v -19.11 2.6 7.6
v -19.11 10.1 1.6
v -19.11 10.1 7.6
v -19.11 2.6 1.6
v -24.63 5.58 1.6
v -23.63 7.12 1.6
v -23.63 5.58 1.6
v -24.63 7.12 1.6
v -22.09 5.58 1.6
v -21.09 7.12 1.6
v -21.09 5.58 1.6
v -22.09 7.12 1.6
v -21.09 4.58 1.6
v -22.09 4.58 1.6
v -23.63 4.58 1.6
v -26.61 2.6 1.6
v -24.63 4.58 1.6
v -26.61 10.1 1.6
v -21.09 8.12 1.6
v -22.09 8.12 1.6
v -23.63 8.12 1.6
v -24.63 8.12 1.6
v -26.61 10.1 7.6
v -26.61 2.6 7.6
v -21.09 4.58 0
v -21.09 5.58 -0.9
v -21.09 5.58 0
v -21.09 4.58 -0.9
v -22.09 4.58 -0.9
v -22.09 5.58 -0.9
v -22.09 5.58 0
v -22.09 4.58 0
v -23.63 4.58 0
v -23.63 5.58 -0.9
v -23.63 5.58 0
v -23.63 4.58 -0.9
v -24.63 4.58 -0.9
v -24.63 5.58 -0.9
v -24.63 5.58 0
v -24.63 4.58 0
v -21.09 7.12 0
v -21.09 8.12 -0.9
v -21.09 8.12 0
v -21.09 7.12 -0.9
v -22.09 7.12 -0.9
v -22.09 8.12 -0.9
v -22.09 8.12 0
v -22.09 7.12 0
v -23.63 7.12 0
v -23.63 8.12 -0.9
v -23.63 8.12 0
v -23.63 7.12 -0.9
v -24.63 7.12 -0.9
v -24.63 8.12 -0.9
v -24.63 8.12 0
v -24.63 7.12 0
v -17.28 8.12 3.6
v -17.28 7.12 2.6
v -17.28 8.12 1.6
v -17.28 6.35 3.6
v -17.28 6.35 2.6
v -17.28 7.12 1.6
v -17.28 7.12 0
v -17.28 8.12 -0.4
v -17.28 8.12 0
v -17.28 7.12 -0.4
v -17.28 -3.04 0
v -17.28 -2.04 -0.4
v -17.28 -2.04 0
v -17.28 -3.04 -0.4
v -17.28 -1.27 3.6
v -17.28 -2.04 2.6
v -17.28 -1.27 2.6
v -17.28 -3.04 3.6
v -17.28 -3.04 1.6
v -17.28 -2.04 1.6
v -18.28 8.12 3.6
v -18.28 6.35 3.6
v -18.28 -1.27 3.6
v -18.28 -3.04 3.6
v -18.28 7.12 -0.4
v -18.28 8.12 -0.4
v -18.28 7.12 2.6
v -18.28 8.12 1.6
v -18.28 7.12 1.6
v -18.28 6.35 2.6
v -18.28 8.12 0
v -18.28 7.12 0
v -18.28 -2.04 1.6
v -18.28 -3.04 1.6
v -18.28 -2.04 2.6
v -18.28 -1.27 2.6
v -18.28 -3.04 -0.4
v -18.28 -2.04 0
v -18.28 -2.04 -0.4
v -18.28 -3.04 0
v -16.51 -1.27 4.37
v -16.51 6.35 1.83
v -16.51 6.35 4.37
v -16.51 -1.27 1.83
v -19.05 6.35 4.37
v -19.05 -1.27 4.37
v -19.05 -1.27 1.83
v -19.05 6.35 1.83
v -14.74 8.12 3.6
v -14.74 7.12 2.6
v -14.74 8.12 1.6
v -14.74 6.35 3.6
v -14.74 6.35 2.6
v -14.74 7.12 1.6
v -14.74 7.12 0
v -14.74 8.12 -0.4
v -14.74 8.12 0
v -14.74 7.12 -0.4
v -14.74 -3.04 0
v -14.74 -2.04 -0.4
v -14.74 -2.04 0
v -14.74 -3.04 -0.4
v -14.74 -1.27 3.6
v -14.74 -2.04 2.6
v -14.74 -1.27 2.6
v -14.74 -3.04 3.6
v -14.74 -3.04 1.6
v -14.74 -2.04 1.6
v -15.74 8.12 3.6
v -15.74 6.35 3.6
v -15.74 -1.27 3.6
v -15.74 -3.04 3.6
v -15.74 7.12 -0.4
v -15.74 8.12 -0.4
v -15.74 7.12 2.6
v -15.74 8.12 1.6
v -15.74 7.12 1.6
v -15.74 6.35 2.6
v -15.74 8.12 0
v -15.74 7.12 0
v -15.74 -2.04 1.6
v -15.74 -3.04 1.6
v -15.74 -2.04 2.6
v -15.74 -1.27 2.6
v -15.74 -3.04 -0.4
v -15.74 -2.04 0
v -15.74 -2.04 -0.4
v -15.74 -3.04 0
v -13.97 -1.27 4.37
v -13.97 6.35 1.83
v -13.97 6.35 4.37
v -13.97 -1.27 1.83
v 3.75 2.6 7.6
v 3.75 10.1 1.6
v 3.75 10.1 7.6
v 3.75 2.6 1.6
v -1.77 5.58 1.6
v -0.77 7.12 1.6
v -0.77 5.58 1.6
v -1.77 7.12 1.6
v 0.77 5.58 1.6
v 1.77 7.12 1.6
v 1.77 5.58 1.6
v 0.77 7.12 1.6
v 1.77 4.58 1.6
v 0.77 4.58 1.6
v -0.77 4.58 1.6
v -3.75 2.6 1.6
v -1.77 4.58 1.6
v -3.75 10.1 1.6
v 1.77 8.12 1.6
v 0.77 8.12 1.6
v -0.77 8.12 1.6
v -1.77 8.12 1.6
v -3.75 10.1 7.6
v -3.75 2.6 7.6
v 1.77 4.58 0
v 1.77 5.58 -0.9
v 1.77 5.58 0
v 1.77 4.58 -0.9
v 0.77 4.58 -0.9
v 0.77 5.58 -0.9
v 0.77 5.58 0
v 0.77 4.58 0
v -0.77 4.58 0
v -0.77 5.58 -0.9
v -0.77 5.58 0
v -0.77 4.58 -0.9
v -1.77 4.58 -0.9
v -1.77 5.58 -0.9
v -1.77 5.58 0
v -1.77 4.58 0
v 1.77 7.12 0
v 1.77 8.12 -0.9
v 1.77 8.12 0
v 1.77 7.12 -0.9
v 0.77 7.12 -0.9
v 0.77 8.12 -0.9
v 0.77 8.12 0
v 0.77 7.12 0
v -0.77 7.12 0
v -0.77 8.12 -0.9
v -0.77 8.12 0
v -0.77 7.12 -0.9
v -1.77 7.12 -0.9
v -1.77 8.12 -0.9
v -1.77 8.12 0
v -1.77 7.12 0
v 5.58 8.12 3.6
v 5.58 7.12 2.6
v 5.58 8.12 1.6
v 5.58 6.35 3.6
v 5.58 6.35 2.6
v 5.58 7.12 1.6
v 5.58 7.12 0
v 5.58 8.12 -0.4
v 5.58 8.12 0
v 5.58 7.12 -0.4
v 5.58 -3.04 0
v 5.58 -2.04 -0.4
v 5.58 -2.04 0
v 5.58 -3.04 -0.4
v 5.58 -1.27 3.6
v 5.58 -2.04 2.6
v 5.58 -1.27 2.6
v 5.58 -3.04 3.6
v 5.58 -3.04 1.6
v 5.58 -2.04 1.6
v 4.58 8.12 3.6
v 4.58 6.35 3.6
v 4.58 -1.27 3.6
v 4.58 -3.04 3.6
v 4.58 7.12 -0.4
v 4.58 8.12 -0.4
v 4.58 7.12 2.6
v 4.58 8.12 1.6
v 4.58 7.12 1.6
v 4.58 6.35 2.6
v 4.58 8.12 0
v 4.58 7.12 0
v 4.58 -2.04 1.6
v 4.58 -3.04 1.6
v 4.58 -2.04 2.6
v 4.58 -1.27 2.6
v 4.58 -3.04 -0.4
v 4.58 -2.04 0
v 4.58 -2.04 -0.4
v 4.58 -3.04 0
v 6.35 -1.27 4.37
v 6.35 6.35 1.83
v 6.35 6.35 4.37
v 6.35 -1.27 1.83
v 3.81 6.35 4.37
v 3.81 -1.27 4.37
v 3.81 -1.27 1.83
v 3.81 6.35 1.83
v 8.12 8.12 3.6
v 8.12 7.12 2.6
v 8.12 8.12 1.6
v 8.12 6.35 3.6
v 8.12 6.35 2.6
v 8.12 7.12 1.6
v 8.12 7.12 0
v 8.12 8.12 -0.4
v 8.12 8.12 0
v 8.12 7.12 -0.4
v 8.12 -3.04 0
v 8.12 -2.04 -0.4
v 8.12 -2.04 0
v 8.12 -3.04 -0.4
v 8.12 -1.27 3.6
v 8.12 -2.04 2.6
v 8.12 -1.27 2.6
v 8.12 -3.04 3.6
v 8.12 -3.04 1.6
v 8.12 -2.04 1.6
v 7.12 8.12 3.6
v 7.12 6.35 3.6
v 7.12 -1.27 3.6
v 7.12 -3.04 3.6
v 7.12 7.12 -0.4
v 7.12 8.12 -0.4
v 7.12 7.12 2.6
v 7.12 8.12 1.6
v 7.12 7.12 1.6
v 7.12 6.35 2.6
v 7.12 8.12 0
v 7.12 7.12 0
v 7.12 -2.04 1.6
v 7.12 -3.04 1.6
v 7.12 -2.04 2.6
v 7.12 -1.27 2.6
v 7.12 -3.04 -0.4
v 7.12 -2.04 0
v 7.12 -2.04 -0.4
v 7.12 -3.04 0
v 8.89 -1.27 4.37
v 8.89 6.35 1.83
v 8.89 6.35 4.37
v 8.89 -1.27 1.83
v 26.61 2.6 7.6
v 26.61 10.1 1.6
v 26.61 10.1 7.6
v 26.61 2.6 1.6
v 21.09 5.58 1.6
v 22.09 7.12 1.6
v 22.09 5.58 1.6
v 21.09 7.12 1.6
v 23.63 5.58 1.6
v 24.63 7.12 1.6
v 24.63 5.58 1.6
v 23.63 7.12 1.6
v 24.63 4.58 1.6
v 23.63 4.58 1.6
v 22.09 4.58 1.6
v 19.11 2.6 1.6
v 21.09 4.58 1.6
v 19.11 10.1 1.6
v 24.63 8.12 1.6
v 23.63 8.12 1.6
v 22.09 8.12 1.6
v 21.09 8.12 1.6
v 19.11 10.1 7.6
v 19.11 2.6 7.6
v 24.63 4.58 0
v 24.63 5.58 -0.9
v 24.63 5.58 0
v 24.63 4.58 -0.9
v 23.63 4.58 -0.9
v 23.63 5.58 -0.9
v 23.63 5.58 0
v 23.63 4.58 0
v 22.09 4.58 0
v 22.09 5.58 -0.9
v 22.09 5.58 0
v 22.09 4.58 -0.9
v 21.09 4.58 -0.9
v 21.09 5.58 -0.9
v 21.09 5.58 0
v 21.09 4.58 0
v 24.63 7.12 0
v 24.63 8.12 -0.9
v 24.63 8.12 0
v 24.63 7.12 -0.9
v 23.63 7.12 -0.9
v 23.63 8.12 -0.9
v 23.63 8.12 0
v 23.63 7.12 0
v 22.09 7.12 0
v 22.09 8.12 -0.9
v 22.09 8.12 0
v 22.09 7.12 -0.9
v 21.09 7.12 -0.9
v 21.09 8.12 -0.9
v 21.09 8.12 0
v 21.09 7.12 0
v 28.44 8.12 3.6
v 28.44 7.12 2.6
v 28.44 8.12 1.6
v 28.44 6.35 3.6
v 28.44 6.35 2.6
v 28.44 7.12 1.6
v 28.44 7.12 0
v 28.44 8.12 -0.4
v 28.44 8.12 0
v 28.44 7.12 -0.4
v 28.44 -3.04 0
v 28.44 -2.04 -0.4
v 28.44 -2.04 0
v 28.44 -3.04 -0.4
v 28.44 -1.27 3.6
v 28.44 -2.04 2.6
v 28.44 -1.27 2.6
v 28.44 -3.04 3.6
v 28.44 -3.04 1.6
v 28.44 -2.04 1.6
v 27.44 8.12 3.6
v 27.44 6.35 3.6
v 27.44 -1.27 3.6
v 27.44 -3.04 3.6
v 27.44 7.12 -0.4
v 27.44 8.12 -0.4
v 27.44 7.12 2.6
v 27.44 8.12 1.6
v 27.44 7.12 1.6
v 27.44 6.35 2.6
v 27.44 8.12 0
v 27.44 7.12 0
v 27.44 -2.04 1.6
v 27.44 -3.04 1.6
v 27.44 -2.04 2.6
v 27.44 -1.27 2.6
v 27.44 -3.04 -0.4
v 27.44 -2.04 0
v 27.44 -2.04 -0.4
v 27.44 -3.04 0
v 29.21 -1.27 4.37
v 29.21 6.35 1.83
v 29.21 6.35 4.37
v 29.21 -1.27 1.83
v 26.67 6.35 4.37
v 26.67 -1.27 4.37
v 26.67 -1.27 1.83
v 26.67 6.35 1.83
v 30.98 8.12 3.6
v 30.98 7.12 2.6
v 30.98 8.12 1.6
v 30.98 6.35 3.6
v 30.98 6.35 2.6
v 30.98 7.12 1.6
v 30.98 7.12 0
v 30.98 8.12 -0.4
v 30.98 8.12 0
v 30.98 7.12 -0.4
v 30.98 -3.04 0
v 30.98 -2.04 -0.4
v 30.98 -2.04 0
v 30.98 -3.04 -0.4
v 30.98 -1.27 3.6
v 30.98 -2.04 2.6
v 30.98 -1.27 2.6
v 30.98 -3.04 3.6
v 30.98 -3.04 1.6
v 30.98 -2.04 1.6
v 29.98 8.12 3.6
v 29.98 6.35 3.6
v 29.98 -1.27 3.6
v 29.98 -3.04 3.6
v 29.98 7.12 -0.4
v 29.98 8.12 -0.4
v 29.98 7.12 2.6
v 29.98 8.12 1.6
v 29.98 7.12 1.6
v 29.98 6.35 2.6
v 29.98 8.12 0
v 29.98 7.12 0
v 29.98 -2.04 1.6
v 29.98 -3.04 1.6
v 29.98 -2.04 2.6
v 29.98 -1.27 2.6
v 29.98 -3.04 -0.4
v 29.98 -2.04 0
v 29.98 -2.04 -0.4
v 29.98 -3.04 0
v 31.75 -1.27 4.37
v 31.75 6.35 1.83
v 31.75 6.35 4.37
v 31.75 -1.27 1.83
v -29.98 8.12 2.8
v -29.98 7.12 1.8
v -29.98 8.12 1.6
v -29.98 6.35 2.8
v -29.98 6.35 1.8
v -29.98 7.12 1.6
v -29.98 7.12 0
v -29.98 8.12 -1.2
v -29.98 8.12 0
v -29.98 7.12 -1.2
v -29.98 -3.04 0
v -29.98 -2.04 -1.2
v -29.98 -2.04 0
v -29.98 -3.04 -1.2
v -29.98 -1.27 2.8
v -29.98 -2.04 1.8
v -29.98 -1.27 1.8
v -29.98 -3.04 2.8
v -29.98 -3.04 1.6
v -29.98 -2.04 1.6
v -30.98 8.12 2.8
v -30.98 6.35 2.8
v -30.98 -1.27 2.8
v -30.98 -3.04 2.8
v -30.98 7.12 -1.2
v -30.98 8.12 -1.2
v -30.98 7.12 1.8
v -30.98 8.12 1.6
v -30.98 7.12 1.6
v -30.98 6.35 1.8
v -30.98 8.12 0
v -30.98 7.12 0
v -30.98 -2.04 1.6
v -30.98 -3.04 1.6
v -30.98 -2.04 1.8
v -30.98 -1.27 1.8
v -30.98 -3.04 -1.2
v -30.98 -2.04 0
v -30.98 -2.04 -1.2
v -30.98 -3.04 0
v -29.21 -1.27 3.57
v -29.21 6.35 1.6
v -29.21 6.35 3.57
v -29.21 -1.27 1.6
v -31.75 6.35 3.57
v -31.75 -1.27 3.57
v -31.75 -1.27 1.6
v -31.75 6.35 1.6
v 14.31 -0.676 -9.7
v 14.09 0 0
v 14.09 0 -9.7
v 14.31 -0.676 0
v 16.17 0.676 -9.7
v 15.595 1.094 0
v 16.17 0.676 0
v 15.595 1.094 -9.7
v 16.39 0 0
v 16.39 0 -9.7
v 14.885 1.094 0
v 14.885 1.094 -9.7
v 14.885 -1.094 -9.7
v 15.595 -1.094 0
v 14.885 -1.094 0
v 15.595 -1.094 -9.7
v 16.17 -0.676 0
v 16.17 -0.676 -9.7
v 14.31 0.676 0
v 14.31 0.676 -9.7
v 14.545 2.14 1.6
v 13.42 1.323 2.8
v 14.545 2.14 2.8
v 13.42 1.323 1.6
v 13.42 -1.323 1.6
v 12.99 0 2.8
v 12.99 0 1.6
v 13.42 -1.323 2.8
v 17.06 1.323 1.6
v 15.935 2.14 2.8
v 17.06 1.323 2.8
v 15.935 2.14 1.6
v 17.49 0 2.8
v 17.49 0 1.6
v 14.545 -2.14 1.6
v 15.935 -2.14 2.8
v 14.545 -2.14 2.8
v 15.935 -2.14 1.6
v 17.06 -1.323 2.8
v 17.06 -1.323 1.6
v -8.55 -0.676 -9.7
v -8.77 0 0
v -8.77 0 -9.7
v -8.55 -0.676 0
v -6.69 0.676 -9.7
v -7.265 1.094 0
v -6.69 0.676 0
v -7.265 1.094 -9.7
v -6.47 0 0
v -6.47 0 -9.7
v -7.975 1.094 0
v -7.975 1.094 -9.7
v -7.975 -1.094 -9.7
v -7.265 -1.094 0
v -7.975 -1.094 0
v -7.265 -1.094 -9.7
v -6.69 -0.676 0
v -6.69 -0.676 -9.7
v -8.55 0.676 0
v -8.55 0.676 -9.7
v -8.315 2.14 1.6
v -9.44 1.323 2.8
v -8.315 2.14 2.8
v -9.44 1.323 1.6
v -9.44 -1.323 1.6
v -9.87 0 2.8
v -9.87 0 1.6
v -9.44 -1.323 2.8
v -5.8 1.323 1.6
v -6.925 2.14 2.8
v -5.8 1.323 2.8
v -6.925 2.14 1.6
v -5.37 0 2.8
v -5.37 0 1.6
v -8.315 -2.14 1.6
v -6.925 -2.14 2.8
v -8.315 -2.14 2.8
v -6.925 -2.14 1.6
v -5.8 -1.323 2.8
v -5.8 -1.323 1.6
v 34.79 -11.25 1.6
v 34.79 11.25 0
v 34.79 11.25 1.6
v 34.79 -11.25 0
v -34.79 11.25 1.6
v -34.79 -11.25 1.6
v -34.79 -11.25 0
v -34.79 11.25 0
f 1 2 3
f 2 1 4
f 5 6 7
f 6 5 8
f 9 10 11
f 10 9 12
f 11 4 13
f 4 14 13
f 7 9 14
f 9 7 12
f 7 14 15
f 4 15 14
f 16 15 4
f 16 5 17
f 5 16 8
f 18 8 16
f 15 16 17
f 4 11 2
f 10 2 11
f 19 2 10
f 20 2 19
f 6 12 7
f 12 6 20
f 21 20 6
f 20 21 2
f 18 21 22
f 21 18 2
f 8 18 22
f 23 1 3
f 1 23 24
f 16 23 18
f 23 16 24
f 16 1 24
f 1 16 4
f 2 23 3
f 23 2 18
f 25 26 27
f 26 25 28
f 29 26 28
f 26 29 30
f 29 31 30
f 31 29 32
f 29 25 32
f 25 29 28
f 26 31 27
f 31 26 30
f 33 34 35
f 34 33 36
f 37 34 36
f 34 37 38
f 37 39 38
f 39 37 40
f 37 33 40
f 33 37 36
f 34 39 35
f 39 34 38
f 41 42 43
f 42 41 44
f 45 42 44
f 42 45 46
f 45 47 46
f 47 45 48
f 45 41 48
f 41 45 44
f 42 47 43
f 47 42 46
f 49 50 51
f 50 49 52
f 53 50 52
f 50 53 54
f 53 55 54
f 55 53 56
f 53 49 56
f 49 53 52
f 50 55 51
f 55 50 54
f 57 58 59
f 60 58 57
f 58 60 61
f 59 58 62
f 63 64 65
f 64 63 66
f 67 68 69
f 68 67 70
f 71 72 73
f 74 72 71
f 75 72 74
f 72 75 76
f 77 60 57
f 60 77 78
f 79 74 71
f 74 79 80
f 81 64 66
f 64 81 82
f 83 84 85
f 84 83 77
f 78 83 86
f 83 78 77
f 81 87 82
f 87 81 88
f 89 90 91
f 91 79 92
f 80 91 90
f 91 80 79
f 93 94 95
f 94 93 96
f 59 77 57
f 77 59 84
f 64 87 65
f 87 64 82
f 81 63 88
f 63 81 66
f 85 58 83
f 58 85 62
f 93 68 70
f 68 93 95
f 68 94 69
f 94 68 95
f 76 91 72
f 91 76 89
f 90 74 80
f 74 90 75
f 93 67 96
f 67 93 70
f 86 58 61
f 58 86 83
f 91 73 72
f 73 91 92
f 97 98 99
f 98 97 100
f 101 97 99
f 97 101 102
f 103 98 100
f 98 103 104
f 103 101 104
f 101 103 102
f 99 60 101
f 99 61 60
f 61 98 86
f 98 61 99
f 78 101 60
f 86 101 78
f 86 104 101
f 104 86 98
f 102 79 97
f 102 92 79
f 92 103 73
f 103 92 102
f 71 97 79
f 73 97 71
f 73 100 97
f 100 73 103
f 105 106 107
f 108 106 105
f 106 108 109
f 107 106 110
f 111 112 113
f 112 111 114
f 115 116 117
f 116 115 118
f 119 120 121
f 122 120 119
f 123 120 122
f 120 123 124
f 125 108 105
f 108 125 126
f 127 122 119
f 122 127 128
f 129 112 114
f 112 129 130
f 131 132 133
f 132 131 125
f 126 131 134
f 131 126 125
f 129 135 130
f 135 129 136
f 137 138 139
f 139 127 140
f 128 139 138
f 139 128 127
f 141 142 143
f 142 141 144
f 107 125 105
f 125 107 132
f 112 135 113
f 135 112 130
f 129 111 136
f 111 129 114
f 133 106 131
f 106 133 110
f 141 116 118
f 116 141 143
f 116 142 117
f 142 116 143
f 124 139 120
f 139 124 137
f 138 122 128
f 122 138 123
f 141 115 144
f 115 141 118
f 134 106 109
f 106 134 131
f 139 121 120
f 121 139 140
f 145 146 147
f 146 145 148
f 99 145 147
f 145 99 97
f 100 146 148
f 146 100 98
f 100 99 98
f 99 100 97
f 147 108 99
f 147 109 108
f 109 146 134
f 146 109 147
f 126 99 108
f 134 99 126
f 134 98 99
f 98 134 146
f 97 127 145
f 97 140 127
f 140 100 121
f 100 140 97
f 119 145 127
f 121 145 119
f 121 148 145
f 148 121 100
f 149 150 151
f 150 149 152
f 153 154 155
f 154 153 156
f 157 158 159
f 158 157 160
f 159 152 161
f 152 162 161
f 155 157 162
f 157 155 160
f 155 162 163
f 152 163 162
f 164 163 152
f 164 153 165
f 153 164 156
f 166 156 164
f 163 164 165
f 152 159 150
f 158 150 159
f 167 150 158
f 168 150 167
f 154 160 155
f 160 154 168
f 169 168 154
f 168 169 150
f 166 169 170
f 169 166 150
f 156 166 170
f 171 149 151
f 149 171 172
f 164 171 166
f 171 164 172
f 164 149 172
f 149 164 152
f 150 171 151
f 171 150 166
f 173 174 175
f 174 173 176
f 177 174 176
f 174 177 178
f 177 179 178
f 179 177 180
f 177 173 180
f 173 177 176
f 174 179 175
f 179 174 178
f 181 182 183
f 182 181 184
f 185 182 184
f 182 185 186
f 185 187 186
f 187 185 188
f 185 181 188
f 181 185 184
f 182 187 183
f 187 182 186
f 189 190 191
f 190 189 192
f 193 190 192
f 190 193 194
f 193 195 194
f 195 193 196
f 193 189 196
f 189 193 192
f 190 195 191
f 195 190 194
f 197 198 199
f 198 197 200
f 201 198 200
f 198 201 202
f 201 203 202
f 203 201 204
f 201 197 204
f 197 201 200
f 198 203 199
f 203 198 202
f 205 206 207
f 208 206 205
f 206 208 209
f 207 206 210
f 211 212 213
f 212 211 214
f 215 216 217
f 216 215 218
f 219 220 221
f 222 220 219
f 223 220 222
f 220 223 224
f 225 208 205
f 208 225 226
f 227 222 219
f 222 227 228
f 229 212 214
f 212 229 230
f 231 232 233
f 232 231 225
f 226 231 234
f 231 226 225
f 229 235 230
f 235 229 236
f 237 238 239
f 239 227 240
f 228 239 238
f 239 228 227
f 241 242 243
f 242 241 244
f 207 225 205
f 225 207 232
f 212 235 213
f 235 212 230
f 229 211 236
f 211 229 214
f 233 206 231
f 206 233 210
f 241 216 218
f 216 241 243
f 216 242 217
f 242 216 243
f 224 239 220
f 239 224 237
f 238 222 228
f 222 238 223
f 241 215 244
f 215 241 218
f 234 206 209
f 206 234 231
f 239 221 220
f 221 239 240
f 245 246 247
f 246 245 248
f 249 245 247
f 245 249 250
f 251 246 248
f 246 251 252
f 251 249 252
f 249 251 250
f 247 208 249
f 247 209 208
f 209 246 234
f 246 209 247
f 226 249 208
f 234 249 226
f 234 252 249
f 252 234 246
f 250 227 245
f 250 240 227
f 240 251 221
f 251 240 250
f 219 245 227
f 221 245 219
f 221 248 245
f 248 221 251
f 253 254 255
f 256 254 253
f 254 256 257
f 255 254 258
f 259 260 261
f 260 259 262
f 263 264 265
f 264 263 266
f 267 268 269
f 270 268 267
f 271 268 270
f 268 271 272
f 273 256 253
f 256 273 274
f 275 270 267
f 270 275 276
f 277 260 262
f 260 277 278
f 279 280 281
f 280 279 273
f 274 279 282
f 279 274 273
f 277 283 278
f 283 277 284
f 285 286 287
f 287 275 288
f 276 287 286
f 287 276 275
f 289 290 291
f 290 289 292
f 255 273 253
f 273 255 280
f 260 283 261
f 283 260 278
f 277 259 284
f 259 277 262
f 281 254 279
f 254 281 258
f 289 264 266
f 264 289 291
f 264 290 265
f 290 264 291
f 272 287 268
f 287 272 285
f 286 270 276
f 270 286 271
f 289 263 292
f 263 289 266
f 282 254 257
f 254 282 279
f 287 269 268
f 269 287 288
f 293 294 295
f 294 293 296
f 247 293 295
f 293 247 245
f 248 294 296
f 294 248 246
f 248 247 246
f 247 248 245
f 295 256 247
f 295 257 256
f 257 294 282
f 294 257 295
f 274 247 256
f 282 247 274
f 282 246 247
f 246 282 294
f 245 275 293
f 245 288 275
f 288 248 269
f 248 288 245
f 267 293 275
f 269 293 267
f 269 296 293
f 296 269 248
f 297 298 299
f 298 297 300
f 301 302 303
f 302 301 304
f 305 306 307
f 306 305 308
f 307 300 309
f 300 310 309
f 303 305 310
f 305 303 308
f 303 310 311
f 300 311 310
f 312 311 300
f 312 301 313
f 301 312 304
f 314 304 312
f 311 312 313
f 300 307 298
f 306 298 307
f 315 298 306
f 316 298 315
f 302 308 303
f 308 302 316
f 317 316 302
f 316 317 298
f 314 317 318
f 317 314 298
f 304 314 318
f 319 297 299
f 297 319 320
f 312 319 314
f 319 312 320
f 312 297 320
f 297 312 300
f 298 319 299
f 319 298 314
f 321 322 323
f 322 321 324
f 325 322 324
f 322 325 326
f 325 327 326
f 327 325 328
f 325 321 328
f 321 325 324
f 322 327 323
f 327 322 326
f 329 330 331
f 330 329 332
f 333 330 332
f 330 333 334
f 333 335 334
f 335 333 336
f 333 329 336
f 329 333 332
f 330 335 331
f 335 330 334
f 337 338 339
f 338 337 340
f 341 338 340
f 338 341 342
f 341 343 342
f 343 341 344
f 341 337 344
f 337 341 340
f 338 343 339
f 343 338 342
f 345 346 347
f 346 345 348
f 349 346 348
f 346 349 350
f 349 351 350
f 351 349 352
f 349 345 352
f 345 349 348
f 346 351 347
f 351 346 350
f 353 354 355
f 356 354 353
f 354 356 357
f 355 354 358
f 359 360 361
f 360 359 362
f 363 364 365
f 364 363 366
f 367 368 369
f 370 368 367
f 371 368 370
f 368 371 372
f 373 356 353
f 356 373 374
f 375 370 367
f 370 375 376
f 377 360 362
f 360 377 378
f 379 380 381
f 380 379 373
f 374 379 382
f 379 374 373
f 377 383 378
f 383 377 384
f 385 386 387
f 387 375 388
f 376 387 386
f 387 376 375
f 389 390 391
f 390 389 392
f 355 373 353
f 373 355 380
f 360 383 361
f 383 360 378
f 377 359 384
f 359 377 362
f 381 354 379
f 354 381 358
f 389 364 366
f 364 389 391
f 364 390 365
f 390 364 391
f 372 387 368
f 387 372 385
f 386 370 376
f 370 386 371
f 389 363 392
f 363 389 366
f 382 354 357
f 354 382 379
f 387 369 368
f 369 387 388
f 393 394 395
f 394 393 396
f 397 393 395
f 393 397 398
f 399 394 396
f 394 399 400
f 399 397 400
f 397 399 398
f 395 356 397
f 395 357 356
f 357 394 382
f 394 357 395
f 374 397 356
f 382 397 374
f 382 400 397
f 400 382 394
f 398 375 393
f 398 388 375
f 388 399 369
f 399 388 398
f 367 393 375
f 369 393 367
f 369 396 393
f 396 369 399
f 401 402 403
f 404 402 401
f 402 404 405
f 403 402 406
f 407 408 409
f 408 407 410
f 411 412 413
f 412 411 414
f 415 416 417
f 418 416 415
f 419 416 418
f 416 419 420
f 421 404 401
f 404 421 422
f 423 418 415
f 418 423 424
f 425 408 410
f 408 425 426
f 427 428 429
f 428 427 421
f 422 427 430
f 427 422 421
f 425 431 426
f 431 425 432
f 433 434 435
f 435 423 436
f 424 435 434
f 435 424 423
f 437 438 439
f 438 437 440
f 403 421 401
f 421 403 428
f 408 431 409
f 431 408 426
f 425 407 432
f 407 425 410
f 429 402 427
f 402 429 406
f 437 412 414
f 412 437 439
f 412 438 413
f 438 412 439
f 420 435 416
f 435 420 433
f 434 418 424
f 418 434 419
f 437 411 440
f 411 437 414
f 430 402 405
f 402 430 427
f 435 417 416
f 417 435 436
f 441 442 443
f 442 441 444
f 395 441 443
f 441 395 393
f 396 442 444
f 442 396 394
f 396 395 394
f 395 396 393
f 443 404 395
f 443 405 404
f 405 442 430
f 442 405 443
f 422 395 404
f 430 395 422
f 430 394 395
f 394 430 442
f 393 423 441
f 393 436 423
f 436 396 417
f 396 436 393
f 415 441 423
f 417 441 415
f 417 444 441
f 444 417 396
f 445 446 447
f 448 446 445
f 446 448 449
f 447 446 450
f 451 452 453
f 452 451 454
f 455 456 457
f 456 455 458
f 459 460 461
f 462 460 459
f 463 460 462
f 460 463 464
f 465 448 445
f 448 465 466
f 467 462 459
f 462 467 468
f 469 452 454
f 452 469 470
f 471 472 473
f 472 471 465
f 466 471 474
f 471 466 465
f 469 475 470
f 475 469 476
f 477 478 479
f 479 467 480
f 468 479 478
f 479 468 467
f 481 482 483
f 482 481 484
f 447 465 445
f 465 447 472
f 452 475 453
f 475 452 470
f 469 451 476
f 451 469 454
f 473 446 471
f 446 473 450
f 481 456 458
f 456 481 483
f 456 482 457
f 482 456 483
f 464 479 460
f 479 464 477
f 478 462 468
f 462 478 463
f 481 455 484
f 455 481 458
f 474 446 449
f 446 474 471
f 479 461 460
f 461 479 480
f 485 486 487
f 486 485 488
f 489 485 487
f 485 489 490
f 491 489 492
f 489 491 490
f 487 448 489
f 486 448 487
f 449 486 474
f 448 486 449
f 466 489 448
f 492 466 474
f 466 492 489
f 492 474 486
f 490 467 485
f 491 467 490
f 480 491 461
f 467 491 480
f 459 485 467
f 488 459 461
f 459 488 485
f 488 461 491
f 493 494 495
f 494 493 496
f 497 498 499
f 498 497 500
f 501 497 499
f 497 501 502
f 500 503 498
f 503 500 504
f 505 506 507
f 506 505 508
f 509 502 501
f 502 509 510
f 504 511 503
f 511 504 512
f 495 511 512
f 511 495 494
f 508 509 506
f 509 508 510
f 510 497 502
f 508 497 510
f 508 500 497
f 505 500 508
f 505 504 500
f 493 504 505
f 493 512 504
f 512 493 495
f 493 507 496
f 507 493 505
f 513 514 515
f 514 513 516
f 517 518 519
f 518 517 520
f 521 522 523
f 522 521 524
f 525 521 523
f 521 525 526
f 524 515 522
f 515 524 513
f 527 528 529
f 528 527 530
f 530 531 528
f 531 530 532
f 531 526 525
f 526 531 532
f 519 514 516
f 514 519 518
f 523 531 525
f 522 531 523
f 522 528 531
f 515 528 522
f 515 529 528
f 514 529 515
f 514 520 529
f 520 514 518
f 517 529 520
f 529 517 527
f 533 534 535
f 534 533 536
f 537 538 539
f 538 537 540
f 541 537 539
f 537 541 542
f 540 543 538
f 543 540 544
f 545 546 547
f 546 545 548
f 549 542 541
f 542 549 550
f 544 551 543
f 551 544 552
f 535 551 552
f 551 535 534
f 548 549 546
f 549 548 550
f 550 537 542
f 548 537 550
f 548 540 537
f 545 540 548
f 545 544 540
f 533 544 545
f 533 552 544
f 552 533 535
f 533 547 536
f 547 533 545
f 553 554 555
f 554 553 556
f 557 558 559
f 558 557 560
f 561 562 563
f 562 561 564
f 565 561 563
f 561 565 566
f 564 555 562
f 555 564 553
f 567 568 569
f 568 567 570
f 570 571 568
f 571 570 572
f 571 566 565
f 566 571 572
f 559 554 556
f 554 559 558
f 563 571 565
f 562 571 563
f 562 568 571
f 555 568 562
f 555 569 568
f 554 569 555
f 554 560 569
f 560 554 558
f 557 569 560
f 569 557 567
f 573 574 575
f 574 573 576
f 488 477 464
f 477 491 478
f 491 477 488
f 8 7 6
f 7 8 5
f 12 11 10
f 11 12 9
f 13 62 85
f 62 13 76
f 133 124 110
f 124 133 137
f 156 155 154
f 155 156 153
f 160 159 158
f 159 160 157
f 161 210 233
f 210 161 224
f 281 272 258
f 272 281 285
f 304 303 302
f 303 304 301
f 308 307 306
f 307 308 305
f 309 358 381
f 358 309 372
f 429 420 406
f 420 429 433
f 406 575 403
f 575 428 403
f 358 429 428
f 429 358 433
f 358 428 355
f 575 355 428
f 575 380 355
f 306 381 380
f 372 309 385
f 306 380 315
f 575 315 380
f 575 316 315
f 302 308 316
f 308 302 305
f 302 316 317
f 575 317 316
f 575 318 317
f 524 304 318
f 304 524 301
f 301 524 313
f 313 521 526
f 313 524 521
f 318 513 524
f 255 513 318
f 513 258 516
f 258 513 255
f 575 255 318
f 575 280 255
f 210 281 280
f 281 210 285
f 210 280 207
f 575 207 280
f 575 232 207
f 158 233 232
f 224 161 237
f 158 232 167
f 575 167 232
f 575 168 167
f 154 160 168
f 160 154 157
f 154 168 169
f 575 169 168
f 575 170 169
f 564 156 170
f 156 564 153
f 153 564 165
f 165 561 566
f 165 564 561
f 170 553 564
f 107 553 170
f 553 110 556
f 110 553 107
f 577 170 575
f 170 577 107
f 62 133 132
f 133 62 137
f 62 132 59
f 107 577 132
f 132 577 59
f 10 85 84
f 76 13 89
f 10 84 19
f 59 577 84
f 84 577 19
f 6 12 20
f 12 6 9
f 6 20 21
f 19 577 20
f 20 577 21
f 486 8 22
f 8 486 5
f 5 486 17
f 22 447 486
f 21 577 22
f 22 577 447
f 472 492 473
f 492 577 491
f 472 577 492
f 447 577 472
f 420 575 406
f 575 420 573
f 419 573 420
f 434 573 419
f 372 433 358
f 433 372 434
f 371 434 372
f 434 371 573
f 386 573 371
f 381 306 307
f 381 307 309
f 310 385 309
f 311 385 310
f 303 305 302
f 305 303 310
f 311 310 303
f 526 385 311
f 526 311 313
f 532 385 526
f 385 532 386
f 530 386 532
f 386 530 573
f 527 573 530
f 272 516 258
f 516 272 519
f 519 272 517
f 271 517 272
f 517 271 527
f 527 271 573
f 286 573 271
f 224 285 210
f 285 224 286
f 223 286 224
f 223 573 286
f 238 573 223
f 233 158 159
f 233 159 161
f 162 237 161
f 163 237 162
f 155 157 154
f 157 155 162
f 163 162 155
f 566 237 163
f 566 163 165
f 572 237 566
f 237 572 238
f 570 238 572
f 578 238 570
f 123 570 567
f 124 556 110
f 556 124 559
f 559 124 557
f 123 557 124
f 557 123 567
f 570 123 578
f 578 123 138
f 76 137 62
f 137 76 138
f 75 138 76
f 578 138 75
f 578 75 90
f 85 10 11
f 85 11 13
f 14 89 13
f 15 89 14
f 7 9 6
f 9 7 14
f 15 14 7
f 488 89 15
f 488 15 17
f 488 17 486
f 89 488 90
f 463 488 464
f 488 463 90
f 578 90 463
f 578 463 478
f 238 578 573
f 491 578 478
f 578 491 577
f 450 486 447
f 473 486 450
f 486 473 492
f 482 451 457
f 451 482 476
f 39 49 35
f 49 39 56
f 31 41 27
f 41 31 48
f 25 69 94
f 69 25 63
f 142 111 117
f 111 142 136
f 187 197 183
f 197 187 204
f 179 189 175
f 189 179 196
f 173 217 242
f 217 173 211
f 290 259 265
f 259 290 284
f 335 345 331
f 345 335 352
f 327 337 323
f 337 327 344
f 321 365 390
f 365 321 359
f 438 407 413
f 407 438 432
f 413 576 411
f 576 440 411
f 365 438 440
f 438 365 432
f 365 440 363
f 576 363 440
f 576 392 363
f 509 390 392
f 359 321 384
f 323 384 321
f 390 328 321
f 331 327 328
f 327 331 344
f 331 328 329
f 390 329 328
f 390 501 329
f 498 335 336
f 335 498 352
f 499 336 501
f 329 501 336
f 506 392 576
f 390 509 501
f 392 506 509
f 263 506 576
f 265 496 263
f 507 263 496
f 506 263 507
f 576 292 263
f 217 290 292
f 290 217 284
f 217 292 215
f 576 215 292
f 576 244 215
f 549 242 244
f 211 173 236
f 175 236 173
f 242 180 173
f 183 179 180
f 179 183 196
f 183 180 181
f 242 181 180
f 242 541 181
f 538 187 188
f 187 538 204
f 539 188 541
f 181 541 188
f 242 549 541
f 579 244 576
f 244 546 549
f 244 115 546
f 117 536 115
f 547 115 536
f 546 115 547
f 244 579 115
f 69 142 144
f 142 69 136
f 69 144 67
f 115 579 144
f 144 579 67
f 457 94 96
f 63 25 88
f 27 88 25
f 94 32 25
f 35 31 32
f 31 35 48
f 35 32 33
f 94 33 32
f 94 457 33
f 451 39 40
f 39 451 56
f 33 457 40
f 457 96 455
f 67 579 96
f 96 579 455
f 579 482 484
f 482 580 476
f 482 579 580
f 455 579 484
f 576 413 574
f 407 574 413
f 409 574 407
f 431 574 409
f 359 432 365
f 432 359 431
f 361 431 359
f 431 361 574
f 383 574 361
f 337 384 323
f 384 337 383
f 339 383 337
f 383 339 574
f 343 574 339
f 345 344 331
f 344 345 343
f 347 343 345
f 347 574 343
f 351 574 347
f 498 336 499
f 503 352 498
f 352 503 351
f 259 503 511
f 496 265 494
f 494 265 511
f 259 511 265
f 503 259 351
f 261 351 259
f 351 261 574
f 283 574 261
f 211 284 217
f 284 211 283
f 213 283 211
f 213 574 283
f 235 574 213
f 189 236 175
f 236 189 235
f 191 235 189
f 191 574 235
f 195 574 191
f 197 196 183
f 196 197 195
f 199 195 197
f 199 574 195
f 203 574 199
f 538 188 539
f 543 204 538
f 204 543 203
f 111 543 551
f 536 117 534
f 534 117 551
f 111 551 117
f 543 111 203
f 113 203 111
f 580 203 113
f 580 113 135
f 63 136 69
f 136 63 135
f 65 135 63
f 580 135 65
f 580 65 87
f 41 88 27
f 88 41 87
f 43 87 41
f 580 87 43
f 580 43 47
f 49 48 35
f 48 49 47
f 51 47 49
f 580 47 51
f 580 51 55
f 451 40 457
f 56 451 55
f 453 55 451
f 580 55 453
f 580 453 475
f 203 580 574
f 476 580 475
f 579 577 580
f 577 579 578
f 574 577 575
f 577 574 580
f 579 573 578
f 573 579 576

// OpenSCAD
// to be printed
// *************
*touche();
*boitier_bas() ;
*boitier_haut() ;

$fn = 10 ;

pouce=2.54;

e = 3 ;

usb_x = 13;
usb_y = 7 ;
usb_d = 4 ;
fil_d = 2 ;

touche_dd = 1 ;
touche_a = 10 ;
touche_x = 9*pouce-touche_dd ;
touche_y = 60 ;
touche_z = 5 ;
touche_n= 3 ;
touche_s = 2 ;
touche_dz = 10 ;
touche_rainure = 0.5 ;
touche_embossage_d = 50 ;
butee_y = touche_y / 4;
butee_dz = touche_dz / 4 ;
touches_x = touche_n * touche_x + (touche_n + 1) * touche_dd ;

axe_d=4 ;
axe_dd = 0.4 ;
axe_dy = -touche_y/2 + (axe_d+3)/2 ;
axe_dz = -touche_z/2 ;

boitier_x = (touche_n + 1)*touche_x ;
echo ( "largeur boitier" , boitier_x ) ;
boitier_y = touche_y + 35  ;
echo ( "profondeur boitier" , boitier_y ) ;
boitier_z = 35 ;
boitier_s = 15 ;
boitier_dx = -5 ;
boitier_coupe_z = boitier_z/2 + axe_dz - touche_z/2;
pilier_dx = 4 ;
pilier_x = 10 ;
renfort_z = 3 ;

//ressort_d = 2.3 ;
//ressort_h = 8 ;
ressort_d = 4.3+0.5 ;
ressort_h = 24 ;
ressort_trou_z = 2 ;
ressort_view = 0 ;
ressort_debut = 1.5 ;
ressort_fin = 3.5 ;

joint_e = 0.7 ;

cny70_x = 7.5 ;
cny70_y = 7.5 ;
cny70_z = 6.0 ;
cny70_patte_x = 5.5 ;
cny70_patte_y = 5.5 ;
cny70_patte_z = 8 ;
cny70_fil_l = e ;

dzusbteensy = 4.3 ;
dzteensy = 0 ;
l_trou_usb = 12 ;
h_trou_usb = 9 ;

poussoir_d = 7.5 ;
poussoir_ecrou_d = 13 ;
poussoir_h = 7 ;
poussoir_dy = 12 ;
poussoir_dz = -5 ;
usb_dy = 11 ;

vis_d = 2.3 ;
vis_tete_d=4.5 ;
vis_h=11;
vis_tete_h=1.5;
vis_dy = 22 ;

pcb_x = touches_x ;
echo ( "largeur pcb" , pcb_x ) ;
pcb_y = 3*cny70_y ;
echo ( "longeur pcb" , pcb_y ) ;
pcb_e = 1.6 ;
pcb_dx1 = 6*pouce ;
echo ( "position trou 1", pcb_dx1 - pcb_x/2 , pcb_y/2);
pcb_dx2 = -3*pouce ;
echo ( "position trou 2", pcb_dx2 - pcb_x/2 , pcb_y/2);
pcb_dy=25;
pcb_dz = -1 ;
pcb_a = -6 ;
pcb_support_x = 3*pouce;
pcb_support_y = pcb_y;
pcb_support_z = 20 ;

module vis(em , dd)
{
    // dd : augmentation du trou prepercage
    // em : augentation trou tete
    translate([0,0,-vis_h/2-(vis_tete_h)])
    {
        cylinder(d=vis_d+dd,h=vis_h,center=true);
        translate([0,0,vis_h/2+(vis_tete_h+em)/2])
            cylinder(d=vis_tete_d,h=vis_tete_h+em,center=true);
    }
}
module teensy2()
{
     union()
    {
        for(i=[-6,-5,-4,-3,2,3,5])
        {
            translate([-3*pouce,(i+0.5)* pouce ,4]) cube([0.7,0.7,8],center=true) ;
            translate([3*pouce,(i+0.5)* pouce ,4]) cube([0.7,0.7,8],center=true) ;
        }
        // circuit
        translate([0,0,7])
            cube([7.5*pouce,12*pouce,1.2],center=true);
        // usb
        translate([0,10.5,dzusbteensy])
            difference()
            {
                cube([7,9,4],true);
                cube([5,10,2],true);
            }
        // bouton
        translate([0,-4.5*pouce,4.5])
            cube([3,3,3],true);
   }
}
module cny70(pattex)
{
    // capteur
    translate([0,0,cny70_z/2])
        cube([cny70_x,cny70_y,cny70_z],center = true);
    // fils cone
    *hull()
    {
        translate([0,0,0.05+cny70_z])
            cube([cny70_patte_x,cny70_patte_y,0.1],center = true);
        translate([0,0,cny70_patte_z+cny70_z])
            cylinder(d=fil_d,h=4,center=true);
    }
    *translate([0,0,cny70_patte_z+cny70_z+cny70_fil_l/2])
        cylinder(d= d_fil,h=cny70_fil_l,center= true);
    // pattes
    *translate([0,0,pattex*cny70_patte_z/2+cny70_z])
        cube([cny70_patte_x,cny70_patte_y,pattex*cny70_patte_z],center = true);
    // fil
    *translate([0,0,(cny70_fil_l+6)/2+cny70_patte_z+cny70_z])
        cylinder(d=fil_d,h=cny70_fil_l +6,center=true);
    //pattes
    translate([pouce/2,pouce/2,7])
        cube([1,1,3],center=true);
    translate([-pouce/2,pouce/2,7])
        cube([1,1,3],center=true);
    translate([pouce/2,-pouce/2,7])
        cube([1,1,3],center=true);
    translate([-pouce/2,-pouce/2,7])
        cube([1,1,3],center=true);

}
module resistance()
{
    translate([0,0,3/2])
    {
        translate([0,2*pouce,-1.5])
            cube([1,1,4],center=true);
        translate([0,-2*pouce,-1.5])
            cube([1,1,4],center=true);
        cube([1,4*pouce,1],center=true);
        cube([pouce,3*pouce,pouce],center=true);
    }
}
module pcb()
{
    difference()
    {
        translate([0,0,pcb_e/2])
        {
            cube([pcb_x,pcb_y,pcb_e],center=true);
            // capteurs
            for(i=[1:touche_n])
            {
                echo("cny70 x =" ,(i-(touche_n+1)/2) * ( touche_x + touche_dd ) + pcb_x / 2) ;
                translate([(i-(touche_n+1)/2) * ( touche_x + touche_dd ) ,0,pcb_e/2])
                {
                    translate([0,5*pouce/2,cny70_z])
                        rotate([180,0,0])
                            cny70(0.3);
                    translate([2*pouce,pouce,0])
                        resistance();
                    translate([3*pouce,pouce,0])
                        resistance();
                }
            }
            translate([-12*pouce,pouce,0])
                resistance();
            // vis
            translate([pcb_dx1,0,2])
                vis(0,0);
            translate([pcb_dx2,0,2])
                vis(0,0);
        }
    }
}
module touche()
{
    difference()
    {
        union()
        {
            hull()
            {
                translate([touche_x/2-touche_s/2, touche_y/2 - touche_s/2,touche_z/2- touche_s/2])
                    sphere(d=touche_s);
                translate([-(touche_x/2-touche_s/2), touche_y/2- touche_s/2,touche_z/2- touche_s/2])
                    sphere(d=touche_s);
                translate([touche_x/2-touche_s/2, -(touche_y/2- touche_s/2),touche_z/2- touche_s/2])
                    sphere(d=touche_s);
                translate([-(touche_x/2-touche_s/2), -(touche_y/2- touche_s/2),touche_z/2- touche_s/2])
                    sphere(d=touche_s);
                translate([touche_x/2-touche_s/2, touche_y/2- touche_s/2,-(touche_z/2- touche_s/4)])
                    cube([touche_s/2,touche_s/2,touche_s/2],center=true);
                translate([-(touche_x/2-touche_s/2), touche_y/2- touche_s/2,-(touche_z/2- touche_s/4)])
                    cube([touche_s/2,touche_s/2,touche_s/2],center=true);
                translate([touche_x/2-touche_s/2, -(touche_y/2- touche_s/2),-(touche_z/2- touche_s/4)])
                    cube([touche_s,touche_s,touche_s],center=true);
                translate([-(touche_x/2-touche_s/2), -(touche_y/2- touche_s/2),-(touche_z/2- touche_s/4)])
                    cube([touche_s,touche_s,touche_s],center=true);
                translate([0,-touche_y/2 + (axe_d+3)/2 , -touche_z/2 ])
                    cube([touche_x, axe_d+3,axe_d+3],center=true);
            }
            // axe
            translate([0,-touche_y/2 + (axe_d+3)/2 , -touche_z/2 ])
                cube([touche_x, axe_d+3,axe_d+3],center=true);
            // rondelle d ecartement
            translate([touche_dd/2,-touche_y/2 + (axe_d+3)/2 , -touche_z/2 ])
                rotate([0,90,0])
                    cylinder(d=axe_d + 3, h = touche_x + touche_dd ,center=true);
            // butee
             translate([0,-touche_y/2 - butee_y / 2 + (axe_d+3)/2, -touche_z/2 - butee_dz + e/2 -e ])
                cube([touche_x, butee_y + (axe_d+3) ,e],center=true);
           
        }
        // trou axe
        translate([0,axe_dy, axe_dz  ])
            rotate([0,90,0])
                    cylinder(d=axe_d+axe_dd,h= touche_x+2,center=true);
        // bossage
        translate([0,touche_y/2 - 11 ,touche_embossage_d/2+1.2])
            sphere(d=touche_embossage_d);
    }
    // bord avant
    translate([0,touche_y/2 -e/2 - touche_s/2 - e - touche_dd ,-touche_z/2 - touche_dz/2])
        cube([touche_x-touche_s,e,touche_dz],center = true );

}
module touche_incline(a)
{
    translate([0,axe_dy,axe_dz])
        rotate([-a,0,0])
            translate([0,-axe_dy,-axe_dz])
                touche();
}

module boitier_cube(de)
{
    hull()
    {
        // coins arrondis
        translate([boitier_x/2 - boitier_s/2  - de , boitier_y/2- boitier_s/2 - de , boitier_z/2- boitier_s/2- de ])
            sphere(d=boitier_s);
        translate([-(boitier_x/2 - boitier_s/2 - de ) , boitier_y/2- boitier_s/2 - de , boitier_z/2- boitier_s/2 - de ])
            sphere(d=boitier_s);
        translate([boitier_x/2 - boitier_s/2  - de , -(boitier_y/2- boitier_s/2 - de ) , boitier_z/2- boitier_s/2 - de ])
            sphere(d=boitier_s);
        translate([-(boitier_x/2 - boitier_s/2 - de ) , -(boitier_y/2- boitier_s/2- de ), boitier_z/2- boitier_s/2- de ])
            sphere(d=boitier_s);
        translate([boitier_x/2 - boitier_s/2 +boitier_dx - de  , boitier_y/2- boitier_s/2- de  , -(boitier_z/2- boitier_s/2- de ) ])
            sphere(d=boitier_s);
        translate([-(boitier_x/2 - boitier_s/2+boitier_dx - de  ) , boitier_y/2- boitier_s/2- de , - (boitier_z/2- boitier_s/2 - de )])
            sphere(d=boitier_s);
        translate([boitier_x/2 - boitier_s/2 +boitier_dx - de  , -(boitier_y/2- boitier_s/2 - de ) ,- (boitier_z/2- boitier_s/2- de )])
            sphere(d=boitier_s);
        translate([-(boitier_x/2 - boitier_s/2 +boitier_dx - de ) , -(boitier_y/2- boitier_s/2 - de ) ,- (boitier_z/2- boitier_s/2- de )])
            sphere(d=boitier_s);
        
        // aretes droites pour le bord des touches
        translate([0 , boitier_y/2 - de -e,  (boitier_z/2- de - e/2 )])
            cube([boitier_x - boitier_s,e,e] ,center = true );
        translate([0 , boitier_y/2 - de -e, - (boitier_z/2- de - e/2 )])
            cube([boitier_x - boitier_s,e,e] ,center = true );
    }
}
module boitier(vis_dd)
{
    difference()
    {
        // boitier plein
        boitier_cube(0) ;
        // evidement
        difference()
        {
            boitier_cube(e);
            // butee
            translate([0,(boitier_y - touche_y)/2 - butee_y  - touche_y/2 + e/2, -butee_dz -e/2 - joint_e])
                cube([200,e,boitier_z -2*e - butee_dz -e - joint_e -0.8],center = true);
            // piliers axe
            translate([0,(boitier_y - touche_y)/2 + axe_dy, 0])
                difference()
                {
                    cube([boitier_x,10,100],center = true);
                    cube([touches_x,10,100],center = true);
                }
            // piliers vis
            translate([boitier_x/2-pilier_dx,boitier_y/2 - vis_dy, 0])
                cube([pilier_x,pilier_x,100],center = true);
            translate([boitier_x/2-pilier_dx,-(boitier_y/2 - vis_dy), 0])
                cube([pilier_x,pilier_x,100],center = true);
            translate([-(boitier_x/2-pilier_dx),boitier_y/2 - vis_dy, 0])
                cube([pilier_x,pilier_x,100],center = true);
            translate([-(boitier_x/2-pilier_dx),-(boitier_y/2 - vis_dy), 0])
                cube([pilier_x,pilier_x,100],center = true);
            // support bouton poussoir
            translate([-boitier_x/2+7,-boitier_y/2+poussoir_dy , poussoir_dz ])
                cube([8,poussoir_d + 10,poussoir_d + 12] , center = true );
            // support fil usb
            translate([-(boitier_x/2-pilier_dx),-boitier_y/2-3+poussoir_dy, boitier_coupe_z ])
                cube([14, 16,20] , center = true );
            // support pcb
            rotate([pcb_a,0,0])
                translate([pcb_dx1,pcb_dy,-pcb_support_z/2 + pcb_dz])
                    cube([pcb_support_x,pcb_support_y,pcb_support_z],center = true);
            rotate([pcb_a,0,0])
                translate([pcb_dx2,pcb_dy,-pcb_support_z/2 + pcb_dz])
                    cube([pcb_support_x,pcb_support_y,pcb_support_z],center = true);
        }
        // vis boitier
        translate([boitier_x/2-pilier_dx-1,boitier_y/2 - vis_dy, boitier_z/2 - 2])
            rotate([180,0,0])
                translate([0,0,vis_h+vis_tete_h])
                    vis(20,vis_dd);
        translate([-(boitier_x/2-pilier_dx-1),boitier_y/2 - vis_dy, boitier_z/2 - 2])
            rotate([180,0,0])
                translate([0,0,vis_h+vis_tete_h])
                    vis(20,vis_dd);
        translate([boitier_x/2-pilier_dx-1,-(boitier_y/2 - vis_dy), boitier_z/2 - 2])
            rotate([180,0,0])
                translate([0,0,vis_h+vis_tete_h])
                    vis(20,vis_dd);
        translate([-(boitier_x/2-pilier_dx-1),-(boitier_y/2 - vis_dy), boitier_z/2 - 2])
            rotate([180,0,0])
                translate([0,0,vis_h+vis_tete_h])
                    vis(20,vis_dd);
        // vis pcb
        rotate([pcb_a,0,0])
            translate([pcb_dx1,pcb_dy,-boitier_z/2 + vis_h  + 2.5])
                cylinder(d=vis_d, h = vis_h+2,center = true);
        rotate([pcb_a,0,0])
            translate([pcb_dx2,pcb_dy,-boitier_z/2 + vis_h  + 2.5])
                cylinder(d=vis_d, h = vis_h+2,center = true);
        // touches
        translate([0,boitier_y/2-touche_y/2,50+boitier_z/2-touche_z-touche_dz])
            cube([touches_x ,touche_y+touche_dd*2,100],center = true);
       // axe touches
        translate([0, (boitier_y - touche_y)/2 + axe_dy , boitier_z/2 - touche_z/2-touche_z/2])
            rotate([0,90,0])
                cylinder(d=axe_d,h= boitier_x -9,center = true);
       // trou fil usb
        translate([ - boitier_x/2 , -boitier_y / 2 +usb_dy ,   boitier_coupe_z])
            rotate([0,90,,0])
                cylinder(d=usb_d , h = 35,center = true);
        // trou bouton poussoir
        translate([-boitier_x/2+e,-boitier_y/2+12 , poussoir_dz ])
            rotate([0,90,0])
                    cylinder(d=poussoir_d, h = poussoir_h + 20  , center = true );
        translate([-boitier_x/2+2,-boitier_y/2+12 , poussoir_dz ])
            rotate([0,90,0])
                    cylinder(d=poussoir_ecrou_d, h = 10  , center = true );
        // passe-fil
        translate([-24,(boitier_y - touche_y)/2 - butee_y  - touche_y/2 + e/2,-boitier_z/2+7])
            cube([8,20,6],center = true);
        // trou de regard led Teensy4
        // trou de regard led Teensy4
        translate([27,-boitier_y/2,3])
            cube([3,10,3],center = true);
    }
    // rondelle d ecartement
    difference()
    {
        translate([-touches_x / 2 + touche_dd/2, (boitier_y - touche_y)/2 + axe_dy , boitier_z/2 - touche_z/2-touche_z/2])
            rotate([0,90,0])
                cylinder(d=axe_d + 3, h = touche_dd ,center=true);
       // axe touches
        translate([0, (boitier_y - touche_y)/2 + axe_dy , boitier_z/2 - touche_z/2-touche_z/2])
            rotate([0,90,0])
                cylinder(d=axe_d,h= boitier_x -9,center = true);
    }
}
module touches(a)
{
    for(i=[1:touche_n])
    {
        translate([(i-(touche_n+1)/2) * ( touche_x + touche_dd ) , (boitier_y - touche_y)/2 , boitier_z/2 - touche_z/2])
            touche_incline(a) ;
    }
}
module renfort_vis()
{
        translate([boitier_x/2-pilier_dx-1,boitier_y/2 - vis_dy, boitier_coupe_z -renfort_z / 2])
                    cube([pilier_x,pilier_x,renfort_z],center = true);
        translate([-(boitier_x/2-pilier_dx-1),boitier_y/2 - vis_dy, boitier_coupe_z -renfort_z / 2])
                    cube([pilier_x,pilier_x,renfort_z],center = true);
        translate([boitier_x/2-pilier_dx-1,-(boitier_y/2 - vis_dy), boitier_coupe_z -renfort_z / 2])
                    cube([pilier_x,pilier_x,renfort_z],center = true);
        translate([-(boitier_x/2-pilier_dx-1),-(boitier_y/2 - vis_dy), boitier_coupe_z -renfort_z / 2])
                    cube([pilier_x+4,pilier_x,renfort_z],center = true);

}
module boitier_bas()
{
    difference()
    {
        boitier(0.3) ;
        union()
        {
            translate([0,0,50+boitier_coupe_z])
                cube([100,100,100],center=true);
            renfort_vis();
        }  
    }
}
module boitier_haut()
{
    difference()
    {
        boitier(0) ;
        difference()
        {
            translate([0,0,-50+boitier_coupe_z])
                cube([100,100,100],center=true);
            renfort_vis();
        }  
    }
}

////////////////////
// tests
////////////////////
*rotate([180,0,0])
    translate([0,0,vis_h+vis_tete_h])
        vis(15,0);
*teensy2() ;
*cny70() ;
*capteur(20) ;
*difference()
{
    touche() ;
    translate([500,0,0])
        cube([1000,1000,1000],center=true);
}
*touche();
*touche_incline(touche_a) ;
*boitier(0);
*boitier_bas() ;
//*translate([boitier_x  +2,0,-boitier_coupe_z - boitier_z/2 + renfort_z ])
*   boitier_haut() ;
pcb();
*difference()
{
    union()
    {
       *boitier(0);
       boitier_bas()
       *boitier_haut();
       touches(0);
       *touches(touche_a);
        // teensy
        translate([0,-30,0])
            rotate([90,0,0]) rotate([0,0,90])  teensy2() ;
        //  pcb
        rotate([pcb_a,0,0])
            translate([0,pcb_dy, pcb_dz])
                pcb();
    }
    *translate([500 +29,00,0])
        cube([1000,1000,1000],center=true);
}
*difference()
{
    translate([0,0,-50+boitier_coupe_z])
        cube([100,100,100],center=true);
    renfort_vis();
}  
